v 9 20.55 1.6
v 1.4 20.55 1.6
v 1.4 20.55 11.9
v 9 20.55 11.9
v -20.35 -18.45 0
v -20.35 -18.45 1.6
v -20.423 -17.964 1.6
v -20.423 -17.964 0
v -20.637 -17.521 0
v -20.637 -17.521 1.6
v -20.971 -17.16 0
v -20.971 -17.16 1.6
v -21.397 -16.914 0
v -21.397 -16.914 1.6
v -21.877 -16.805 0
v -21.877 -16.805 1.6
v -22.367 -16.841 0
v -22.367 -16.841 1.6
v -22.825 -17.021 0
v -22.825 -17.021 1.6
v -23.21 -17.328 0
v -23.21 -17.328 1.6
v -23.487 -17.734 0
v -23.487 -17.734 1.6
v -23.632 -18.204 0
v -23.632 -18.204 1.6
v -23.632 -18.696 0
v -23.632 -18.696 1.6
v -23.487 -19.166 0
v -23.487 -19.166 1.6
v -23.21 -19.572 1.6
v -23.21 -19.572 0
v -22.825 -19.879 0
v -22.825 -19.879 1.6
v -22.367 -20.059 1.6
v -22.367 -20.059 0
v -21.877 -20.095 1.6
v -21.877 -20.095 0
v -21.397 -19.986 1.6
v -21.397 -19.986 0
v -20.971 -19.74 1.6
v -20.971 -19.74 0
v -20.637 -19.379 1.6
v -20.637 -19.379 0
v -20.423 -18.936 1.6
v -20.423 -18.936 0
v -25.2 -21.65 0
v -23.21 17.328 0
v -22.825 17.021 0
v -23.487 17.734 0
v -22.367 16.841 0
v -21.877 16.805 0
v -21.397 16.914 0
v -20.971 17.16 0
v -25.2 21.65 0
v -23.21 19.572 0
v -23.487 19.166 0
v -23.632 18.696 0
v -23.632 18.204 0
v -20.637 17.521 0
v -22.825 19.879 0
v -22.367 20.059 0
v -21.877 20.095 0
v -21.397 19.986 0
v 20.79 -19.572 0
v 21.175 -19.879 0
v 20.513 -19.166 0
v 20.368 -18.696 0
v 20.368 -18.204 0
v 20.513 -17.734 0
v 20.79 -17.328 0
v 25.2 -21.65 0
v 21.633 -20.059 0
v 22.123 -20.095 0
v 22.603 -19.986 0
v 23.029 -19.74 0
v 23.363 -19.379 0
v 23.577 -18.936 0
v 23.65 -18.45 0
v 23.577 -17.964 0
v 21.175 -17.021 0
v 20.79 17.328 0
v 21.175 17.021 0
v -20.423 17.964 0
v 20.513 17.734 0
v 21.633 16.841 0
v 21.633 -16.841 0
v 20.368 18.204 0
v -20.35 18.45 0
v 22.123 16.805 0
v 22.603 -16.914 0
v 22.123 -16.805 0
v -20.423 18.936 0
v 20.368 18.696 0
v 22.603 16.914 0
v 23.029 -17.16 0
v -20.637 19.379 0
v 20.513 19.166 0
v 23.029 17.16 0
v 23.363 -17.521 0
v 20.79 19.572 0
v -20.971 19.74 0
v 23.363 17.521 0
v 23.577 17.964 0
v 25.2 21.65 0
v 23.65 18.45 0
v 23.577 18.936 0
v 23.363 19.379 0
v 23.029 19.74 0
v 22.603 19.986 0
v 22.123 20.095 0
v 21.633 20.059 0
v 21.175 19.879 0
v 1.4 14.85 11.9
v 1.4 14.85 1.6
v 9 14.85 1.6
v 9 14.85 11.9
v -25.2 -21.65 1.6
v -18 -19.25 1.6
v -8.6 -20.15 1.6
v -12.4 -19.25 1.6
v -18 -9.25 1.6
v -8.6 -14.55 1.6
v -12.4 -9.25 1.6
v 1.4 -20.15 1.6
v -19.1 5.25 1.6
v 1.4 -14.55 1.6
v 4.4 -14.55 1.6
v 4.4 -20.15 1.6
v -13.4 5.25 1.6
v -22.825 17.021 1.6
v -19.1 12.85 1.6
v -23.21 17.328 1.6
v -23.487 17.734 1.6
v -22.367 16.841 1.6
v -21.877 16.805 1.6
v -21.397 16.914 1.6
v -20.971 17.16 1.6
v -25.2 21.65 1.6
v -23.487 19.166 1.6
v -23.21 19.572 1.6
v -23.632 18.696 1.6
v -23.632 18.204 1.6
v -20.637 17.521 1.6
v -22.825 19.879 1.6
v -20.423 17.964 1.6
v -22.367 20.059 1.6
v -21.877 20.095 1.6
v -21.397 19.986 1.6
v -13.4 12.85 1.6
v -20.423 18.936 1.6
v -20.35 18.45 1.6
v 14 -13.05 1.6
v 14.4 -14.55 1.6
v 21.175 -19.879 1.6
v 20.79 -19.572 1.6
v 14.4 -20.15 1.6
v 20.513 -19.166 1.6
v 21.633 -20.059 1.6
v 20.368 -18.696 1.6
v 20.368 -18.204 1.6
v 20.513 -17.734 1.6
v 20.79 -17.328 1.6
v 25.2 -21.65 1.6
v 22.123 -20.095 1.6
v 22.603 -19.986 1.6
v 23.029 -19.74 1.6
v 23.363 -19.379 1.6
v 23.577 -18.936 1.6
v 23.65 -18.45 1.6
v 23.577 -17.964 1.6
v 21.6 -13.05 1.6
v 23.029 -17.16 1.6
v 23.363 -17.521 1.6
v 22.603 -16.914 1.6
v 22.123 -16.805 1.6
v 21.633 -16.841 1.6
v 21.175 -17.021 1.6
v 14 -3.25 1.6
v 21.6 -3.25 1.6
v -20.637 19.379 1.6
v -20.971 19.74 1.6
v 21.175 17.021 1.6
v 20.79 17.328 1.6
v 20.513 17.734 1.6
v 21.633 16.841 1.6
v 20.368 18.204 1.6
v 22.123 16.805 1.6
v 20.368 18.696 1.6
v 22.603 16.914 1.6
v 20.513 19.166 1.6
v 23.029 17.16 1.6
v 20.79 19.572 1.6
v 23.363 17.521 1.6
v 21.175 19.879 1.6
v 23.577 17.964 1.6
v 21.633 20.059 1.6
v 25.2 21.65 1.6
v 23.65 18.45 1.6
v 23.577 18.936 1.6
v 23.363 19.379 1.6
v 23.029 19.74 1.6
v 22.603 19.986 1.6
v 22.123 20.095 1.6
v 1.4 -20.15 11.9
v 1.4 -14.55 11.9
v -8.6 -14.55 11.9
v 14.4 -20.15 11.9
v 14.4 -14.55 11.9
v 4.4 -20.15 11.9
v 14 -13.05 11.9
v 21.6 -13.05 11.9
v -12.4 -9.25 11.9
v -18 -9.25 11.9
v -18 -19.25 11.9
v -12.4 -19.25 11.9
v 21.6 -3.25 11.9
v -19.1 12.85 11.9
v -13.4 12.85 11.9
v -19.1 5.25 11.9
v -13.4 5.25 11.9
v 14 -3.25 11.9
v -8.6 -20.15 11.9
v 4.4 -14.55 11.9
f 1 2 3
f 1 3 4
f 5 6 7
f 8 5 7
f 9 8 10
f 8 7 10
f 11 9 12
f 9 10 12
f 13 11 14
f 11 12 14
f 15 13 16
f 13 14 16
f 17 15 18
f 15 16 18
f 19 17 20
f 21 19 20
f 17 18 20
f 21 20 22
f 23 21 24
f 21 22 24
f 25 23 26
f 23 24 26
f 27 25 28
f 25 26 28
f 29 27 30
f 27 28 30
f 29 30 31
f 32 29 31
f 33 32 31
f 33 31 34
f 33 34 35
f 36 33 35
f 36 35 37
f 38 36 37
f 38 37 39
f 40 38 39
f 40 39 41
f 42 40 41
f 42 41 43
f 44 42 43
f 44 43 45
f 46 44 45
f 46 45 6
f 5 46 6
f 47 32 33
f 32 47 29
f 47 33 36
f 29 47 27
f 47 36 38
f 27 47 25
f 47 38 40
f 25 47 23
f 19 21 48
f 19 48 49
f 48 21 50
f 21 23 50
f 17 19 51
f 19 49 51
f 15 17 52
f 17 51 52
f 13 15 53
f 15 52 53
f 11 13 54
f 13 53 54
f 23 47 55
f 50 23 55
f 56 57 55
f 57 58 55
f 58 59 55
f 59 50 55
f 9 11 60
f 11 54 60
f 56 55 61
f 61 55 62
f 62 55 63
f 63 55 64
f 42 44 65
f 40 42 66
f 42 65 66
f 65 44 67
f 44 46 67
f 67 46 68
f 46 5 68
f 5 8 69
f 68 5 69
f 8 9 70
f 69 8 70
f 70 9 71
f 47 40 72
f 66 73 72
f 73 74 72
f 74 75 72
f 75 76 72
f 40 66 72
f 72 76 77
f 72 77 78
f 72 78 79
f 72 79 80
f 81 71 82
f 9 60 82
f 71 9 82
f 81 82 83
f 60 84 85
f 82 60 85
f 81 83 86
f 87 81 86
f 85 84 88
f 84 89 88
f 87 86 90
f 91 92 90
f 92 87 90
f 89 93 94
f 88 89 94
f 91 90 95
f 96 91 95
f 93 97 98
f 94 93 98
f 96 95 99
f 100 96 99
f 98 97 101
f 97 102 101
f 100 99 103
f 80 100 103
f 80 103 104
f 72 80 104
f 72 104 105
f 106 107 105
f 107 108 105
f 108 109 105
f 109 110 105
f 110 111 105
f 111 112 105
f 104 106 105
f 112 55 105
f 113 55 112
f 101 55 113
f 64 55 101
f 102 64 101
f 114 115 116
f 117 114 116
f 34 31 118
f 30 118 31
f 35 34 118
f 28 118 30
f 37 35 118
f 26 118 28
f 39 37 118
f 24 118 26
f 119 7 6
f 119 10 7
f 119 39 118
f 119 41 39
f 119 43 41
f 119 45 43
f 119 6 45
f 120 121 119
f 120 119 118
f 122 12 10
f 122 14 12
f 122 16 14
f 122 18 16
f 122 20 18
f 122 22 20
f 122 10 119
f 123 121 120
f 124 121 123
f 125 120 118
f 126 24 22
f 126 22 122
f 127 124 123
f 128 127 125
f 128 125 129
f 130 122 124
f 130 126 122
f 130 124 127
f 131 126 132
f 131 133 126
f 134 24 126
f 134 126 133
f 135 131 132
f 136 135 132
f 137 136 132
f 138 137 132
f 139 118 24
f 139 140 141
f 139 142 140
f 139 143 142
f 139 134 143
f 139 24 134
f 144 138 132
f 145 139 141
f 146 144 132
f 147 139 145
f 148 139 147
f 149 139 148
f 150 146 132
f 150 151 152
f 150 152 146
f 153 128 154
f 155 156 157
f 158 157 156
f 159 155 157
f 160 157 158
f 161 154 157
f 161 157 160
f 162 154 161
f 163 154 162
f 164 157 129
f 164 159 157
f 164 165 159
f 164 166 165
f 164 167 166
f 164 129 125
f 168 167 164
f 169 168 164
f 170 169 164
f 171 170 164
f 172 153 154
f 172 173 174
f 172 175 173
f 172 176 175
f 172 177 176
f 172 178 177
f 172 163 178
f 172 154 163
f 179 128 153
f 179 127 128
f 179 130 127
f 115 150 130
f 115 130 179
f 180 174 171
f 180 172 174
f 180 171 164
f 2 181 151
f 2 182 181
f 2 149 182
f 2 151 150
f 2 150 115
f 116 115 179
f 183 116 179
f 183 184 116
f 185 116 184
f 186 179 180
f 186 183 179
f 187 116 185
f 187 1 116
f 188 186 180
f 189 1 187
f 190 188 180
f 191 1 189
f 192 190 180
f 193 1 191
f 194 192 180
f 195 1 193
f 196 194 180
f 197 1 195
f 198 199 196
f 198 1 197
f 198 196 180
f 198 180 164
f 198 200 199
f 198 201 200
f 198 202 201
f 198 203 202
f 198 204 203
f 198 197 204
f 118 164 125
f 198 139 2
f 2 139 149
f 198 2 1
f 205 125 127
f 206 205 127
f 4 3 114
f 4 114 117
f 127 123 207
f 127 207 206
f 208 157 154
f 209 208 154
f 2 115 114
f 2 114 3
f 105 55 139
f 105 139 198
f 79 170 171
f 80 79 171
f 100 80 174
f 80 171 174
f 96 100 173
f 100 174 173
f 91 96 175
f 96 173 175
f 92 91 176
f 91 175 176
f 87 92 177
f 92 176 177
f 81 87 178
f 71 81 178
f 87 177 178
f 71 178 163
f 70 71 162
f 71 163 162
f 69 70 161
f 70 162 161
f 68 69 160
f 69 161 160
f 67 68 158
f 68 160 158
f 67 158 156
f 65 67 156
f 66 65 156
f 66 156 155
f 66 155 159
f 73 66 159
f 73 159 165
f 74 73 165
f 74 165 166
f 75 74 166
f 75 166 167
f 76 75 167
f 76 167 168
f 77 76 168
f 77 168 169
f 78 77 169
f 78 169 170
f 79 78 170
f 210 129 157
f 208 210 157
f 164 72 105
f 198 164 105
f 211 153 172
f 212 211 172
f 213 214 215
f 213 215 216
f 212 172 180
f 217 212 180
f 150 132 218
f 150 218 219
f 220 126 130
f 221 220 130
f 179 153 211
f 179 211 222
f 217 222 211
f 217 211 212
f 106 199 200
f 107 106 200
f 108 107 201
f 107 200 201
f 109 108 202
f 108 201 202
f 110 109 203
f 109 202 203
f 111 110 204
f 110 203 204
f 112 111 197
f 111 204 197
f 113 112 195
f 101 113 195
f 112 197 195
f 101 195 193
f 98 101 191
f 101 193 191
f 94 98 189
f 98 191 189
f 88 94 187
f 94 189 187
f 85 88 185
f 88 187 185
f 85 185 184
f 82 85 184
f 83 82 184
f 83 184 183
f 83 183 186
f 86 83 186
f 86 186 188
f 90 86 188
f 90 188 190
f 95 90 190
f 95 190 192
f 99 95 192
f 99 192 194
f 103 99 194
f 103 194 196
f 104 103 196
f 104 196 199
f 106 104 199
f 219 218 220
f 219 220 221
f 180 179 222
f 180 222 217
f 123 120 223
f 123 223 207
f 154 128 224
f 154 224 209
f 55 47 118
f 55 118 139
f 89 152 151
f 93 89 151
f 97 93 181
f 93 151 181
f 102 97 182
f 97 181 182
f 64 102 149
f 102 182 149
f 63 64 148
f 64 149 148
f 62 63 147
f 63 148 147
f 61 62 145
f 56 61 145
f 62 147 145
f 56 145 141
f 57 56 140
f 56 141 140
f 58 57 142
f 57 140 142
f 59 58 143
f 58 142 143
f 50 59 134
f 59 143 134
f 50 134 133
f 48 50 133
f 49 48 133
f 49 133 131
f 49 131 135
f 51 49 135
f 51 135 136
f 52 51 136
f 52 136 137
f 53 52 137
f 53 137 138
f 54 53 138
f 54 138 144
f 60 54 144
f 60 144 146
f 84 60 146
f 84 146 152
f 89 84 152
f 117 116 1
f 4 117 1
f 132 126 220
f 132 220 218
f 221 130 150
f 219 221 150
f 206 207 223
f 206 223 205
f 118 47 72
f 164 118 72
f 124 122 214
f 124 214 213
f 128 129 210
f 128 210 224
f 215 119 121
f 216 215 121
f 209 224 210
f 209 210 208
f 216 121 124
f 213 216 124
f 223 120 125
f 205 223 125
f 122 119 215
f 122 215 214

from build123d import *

# Parameters (mm, degrees)
SKETCH_W      = 50.4
SKETCH_H      = 43.3
PAD_DEPTH     = 1.6
SKETCH001_R   = 1.65
HOLE_DEPTH    = 1.601
SKETCH002_W   = 10
SKETCH002_H   = 5.6
SKETCH002_W_2 = 5.6
SKETCH002_H_2 = 10
SKETCH002_W_3 = 5.7
SKETCH002_H_3 = 7.6
SKETCH002_W_4 = 7.6
SKETCH002_H_4 = 5.7
SKETCH002_H_5 = 9.8
PAD001_DEPTH  = 10.3


with BuildPart() as part:
    # Sketch → Pad (new body)
    with BuildSketch(Plane.XY):
        Rectangle(SKETCH_W, SKETCH_H)
    extrude(amount=PAD_DEPTH)

    # Sketch001 (on Face6 of Pad) → Hole (cut, through all)
    with BuildSketch(Plane.XY.offset(1.6)):
        with Locations((-22, 18.45)):
            Circle(SKETCH001_R)
        with Locations((22, 18.45)):
            Circle(SKETCH001_R)
        with Locations((-22, -18.45)):
            Circle(SKETCH001_R)
        with Locations((22, -18.45)):
            Circle(SKETCH001_R)
    extrude(amount=-HOLE_DEPTH, mode=Mode.SUBTRACT)

    # Sketch002 (on Face5 of Hole) → Pad001 (join)
    with BuildSketch(Plane.XY.offset(1.6)):
        with Locations((9.4, -17.35)):
            Rectangle(SKETCH002_W, SKETCH002_H)
        with Locations((-3.6, -17.35)):
            Rectangle(SKETCH002_W, SKETCH002_H)
        with Locations((-15.2, -14.25)):
            Rectangle(SKETCH002_W_2, SKETCH002_H_2)
        with Locations((-16.25, 9.05)):
            Rectangle(SKETCH002_W_3, SKETCH002_H_3)
        with Locations((5.2, 17.7)):
            Rectangle(SKETCH002_W_4, SKETCH002_H_4)
        with Locations((17.8, -8.15)):
            Rectangle(SKETCH002_W_4, SKETCH002_H_5)
    extrude(amount=PAD001_DEPTH)


solid = part.part
